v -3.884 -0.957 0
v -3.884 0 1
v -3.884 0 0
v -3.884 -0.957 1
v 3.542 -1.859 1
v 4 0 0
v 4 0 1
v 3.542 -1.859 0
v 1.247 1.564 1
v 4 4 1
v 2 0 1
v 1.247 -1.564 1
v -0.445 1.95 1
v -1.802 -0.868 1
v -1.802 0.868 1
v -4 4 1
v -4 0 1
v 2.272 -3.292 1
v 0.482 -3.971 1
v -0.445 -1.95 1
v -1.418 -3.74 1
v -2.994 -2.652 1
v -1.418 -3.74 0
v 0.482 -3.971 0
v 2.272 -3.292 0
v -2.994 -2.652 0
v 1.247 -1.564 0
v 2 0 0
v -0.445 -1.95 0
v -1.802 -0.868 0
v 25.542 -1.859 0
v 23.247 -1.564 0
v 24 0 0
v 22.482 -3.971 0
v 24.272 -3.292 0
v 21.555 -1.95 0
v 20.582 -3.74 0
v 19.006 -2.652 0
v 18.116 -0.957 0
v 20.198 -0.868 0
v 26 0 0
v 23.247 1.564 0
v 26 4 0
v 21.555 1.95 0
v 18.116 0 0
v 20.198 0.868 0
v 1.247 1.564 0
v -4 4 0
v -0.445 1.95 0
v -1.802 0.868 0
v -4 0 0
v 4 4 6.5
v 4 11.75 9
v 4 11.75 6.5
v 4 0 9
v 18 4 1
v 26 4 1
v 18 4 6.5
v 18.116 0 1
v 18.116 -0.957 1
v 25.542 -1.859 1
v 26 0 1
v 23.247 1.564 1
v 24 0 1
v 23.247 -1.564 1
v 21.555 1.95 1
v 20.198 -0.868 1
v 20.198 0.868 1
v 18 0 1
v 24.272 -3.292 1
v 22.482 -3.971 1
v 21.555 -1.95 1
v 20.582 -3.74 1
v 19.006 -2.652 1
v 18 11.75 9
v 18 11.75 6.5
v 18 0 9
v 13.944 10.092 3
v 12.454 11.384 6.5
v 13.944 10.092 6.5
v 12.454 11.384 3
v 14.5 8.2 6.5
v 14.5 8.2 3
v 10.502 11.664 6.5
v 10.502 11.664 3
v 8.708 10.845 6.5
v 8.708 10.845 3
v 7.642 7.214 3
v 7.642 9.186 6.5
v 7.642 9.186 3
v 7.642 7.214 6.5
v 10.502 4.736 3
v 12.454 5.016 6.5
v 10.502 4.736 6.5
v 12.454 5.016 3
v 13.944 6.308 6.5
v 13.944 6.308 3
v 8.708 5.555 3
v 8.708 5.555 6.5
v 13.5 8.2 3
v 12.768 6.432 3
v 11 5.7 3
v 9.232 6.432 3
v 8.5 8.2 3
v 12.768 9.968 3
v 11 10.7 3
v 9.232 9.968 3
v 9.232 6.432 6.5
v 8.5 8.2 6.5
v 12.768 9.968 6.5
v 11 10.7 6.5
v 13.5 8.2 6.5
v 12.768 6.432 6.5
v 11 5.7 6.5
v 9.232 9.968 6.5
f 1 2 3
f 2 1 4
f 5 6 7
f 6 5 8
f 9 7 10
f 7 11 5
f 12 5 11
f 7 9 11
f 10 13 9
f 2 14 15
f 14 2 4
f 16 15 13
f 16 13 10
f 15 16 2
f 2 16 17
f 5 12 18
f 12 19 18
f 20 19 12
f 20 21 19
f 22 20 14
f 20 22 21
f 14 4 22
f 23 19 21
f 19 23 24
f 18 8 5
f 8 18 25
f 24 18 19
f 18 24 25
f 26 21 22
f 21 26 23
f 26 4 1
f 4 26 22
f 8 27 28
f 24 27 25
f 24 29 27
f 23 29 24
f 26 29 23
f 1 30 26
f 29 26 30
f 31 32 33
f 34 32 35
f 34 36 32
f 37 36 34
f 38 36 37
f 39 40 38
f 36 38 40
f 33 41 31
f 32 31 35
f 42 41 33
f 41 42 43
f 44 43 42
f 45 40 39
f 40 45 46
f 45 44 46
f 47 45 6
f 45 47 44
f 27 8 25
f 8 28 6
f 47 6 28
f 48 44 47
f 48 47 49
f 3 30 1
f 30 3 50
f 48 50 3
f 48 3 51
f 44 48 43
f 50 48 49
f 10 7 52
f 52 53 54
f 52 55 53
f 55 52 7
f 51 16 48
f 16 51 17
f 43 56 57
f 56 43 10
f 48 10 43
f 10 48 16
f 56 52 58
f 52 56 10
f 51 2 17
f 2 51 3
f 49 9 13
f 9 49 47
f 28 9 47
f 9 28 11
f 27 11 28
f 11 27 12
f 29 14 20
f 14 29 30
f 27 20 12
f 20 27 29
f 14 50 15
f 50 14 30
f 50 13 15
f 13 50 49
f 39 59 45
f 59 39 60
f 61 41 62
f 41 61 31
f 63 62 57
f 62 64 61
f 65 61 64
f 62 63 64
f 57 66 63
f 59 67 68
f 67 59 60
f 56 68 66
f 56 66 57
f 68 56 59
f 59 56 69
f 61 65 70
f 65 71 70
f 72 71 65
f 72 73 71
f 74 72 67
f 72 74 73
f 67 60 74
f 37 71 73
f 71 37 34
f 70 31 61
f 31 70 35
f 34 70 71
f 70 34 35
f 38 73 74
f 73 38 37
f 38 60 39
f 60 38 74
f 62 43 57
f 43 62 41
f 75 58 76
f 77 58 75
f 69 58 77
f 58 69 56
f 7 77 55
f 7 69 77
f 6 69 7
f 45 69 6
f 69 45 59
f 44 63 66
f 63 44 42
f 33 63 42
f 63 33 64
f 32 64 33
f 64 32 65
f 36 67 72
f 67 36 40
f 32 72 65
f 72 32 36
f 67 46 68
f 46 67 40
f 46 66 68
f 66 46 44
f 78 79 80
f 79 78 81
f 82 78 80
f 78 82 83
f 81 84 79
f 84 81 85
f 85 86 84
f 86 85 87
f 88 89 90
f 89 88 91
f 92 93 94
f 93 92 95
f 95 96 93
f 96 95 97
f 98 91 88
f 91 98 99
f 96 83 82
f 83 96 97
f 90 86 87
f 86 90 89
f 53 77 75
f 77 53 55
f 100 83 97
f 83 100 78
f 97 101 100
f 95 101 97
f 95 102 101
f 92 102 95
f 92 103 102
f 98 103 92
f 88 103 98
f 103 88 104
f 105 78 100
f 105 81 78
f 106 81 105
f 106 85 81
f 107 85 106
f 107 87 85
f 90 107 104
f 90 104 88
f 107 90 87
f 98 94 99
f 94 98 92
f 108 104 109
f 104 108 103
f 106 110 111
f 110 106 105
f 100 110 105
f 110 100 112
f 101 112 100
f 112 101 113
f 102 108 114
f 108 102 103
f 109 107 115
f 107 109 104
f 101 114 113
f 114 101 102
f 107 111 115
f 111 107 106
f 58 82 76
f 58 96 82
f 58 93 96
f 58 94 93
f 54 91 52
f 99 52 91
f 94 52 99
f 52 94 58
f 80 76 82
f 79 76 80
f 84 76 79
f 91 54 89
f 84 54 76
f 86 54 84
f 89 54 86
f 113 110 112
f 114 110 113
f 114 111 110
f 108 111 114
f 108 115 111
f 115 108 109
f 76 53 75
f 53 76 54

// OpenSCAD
// file: screwbracket.scad
module raisedScrewHole(height) {
    difference() {
        union() {
            cylinder(height, r=4);
            translate([-4, 0, 0]) cube([8, 4, height], false);
        }
        
        // translate([0, 0, 1]) cylinder(2, r=3);
        cylinder(height, r=2);
    }
}
// main file
use <screwbracket.scad>;

union() {
    raisedScrewHole(1);
    translate([22, 0, 0]) raisedScrewHole(1);
    translate([4, 0, 0]) cube([14, 4, 9], false);

    translate([4, 1.25, 6.5]) cube([14, 10.5, 2.5], false);
    translate([11, 8.2, 3]) difference() {
        cylinder(r=3.5, h=6);
        cylinder(r=2.5, h=6);
    }
}
